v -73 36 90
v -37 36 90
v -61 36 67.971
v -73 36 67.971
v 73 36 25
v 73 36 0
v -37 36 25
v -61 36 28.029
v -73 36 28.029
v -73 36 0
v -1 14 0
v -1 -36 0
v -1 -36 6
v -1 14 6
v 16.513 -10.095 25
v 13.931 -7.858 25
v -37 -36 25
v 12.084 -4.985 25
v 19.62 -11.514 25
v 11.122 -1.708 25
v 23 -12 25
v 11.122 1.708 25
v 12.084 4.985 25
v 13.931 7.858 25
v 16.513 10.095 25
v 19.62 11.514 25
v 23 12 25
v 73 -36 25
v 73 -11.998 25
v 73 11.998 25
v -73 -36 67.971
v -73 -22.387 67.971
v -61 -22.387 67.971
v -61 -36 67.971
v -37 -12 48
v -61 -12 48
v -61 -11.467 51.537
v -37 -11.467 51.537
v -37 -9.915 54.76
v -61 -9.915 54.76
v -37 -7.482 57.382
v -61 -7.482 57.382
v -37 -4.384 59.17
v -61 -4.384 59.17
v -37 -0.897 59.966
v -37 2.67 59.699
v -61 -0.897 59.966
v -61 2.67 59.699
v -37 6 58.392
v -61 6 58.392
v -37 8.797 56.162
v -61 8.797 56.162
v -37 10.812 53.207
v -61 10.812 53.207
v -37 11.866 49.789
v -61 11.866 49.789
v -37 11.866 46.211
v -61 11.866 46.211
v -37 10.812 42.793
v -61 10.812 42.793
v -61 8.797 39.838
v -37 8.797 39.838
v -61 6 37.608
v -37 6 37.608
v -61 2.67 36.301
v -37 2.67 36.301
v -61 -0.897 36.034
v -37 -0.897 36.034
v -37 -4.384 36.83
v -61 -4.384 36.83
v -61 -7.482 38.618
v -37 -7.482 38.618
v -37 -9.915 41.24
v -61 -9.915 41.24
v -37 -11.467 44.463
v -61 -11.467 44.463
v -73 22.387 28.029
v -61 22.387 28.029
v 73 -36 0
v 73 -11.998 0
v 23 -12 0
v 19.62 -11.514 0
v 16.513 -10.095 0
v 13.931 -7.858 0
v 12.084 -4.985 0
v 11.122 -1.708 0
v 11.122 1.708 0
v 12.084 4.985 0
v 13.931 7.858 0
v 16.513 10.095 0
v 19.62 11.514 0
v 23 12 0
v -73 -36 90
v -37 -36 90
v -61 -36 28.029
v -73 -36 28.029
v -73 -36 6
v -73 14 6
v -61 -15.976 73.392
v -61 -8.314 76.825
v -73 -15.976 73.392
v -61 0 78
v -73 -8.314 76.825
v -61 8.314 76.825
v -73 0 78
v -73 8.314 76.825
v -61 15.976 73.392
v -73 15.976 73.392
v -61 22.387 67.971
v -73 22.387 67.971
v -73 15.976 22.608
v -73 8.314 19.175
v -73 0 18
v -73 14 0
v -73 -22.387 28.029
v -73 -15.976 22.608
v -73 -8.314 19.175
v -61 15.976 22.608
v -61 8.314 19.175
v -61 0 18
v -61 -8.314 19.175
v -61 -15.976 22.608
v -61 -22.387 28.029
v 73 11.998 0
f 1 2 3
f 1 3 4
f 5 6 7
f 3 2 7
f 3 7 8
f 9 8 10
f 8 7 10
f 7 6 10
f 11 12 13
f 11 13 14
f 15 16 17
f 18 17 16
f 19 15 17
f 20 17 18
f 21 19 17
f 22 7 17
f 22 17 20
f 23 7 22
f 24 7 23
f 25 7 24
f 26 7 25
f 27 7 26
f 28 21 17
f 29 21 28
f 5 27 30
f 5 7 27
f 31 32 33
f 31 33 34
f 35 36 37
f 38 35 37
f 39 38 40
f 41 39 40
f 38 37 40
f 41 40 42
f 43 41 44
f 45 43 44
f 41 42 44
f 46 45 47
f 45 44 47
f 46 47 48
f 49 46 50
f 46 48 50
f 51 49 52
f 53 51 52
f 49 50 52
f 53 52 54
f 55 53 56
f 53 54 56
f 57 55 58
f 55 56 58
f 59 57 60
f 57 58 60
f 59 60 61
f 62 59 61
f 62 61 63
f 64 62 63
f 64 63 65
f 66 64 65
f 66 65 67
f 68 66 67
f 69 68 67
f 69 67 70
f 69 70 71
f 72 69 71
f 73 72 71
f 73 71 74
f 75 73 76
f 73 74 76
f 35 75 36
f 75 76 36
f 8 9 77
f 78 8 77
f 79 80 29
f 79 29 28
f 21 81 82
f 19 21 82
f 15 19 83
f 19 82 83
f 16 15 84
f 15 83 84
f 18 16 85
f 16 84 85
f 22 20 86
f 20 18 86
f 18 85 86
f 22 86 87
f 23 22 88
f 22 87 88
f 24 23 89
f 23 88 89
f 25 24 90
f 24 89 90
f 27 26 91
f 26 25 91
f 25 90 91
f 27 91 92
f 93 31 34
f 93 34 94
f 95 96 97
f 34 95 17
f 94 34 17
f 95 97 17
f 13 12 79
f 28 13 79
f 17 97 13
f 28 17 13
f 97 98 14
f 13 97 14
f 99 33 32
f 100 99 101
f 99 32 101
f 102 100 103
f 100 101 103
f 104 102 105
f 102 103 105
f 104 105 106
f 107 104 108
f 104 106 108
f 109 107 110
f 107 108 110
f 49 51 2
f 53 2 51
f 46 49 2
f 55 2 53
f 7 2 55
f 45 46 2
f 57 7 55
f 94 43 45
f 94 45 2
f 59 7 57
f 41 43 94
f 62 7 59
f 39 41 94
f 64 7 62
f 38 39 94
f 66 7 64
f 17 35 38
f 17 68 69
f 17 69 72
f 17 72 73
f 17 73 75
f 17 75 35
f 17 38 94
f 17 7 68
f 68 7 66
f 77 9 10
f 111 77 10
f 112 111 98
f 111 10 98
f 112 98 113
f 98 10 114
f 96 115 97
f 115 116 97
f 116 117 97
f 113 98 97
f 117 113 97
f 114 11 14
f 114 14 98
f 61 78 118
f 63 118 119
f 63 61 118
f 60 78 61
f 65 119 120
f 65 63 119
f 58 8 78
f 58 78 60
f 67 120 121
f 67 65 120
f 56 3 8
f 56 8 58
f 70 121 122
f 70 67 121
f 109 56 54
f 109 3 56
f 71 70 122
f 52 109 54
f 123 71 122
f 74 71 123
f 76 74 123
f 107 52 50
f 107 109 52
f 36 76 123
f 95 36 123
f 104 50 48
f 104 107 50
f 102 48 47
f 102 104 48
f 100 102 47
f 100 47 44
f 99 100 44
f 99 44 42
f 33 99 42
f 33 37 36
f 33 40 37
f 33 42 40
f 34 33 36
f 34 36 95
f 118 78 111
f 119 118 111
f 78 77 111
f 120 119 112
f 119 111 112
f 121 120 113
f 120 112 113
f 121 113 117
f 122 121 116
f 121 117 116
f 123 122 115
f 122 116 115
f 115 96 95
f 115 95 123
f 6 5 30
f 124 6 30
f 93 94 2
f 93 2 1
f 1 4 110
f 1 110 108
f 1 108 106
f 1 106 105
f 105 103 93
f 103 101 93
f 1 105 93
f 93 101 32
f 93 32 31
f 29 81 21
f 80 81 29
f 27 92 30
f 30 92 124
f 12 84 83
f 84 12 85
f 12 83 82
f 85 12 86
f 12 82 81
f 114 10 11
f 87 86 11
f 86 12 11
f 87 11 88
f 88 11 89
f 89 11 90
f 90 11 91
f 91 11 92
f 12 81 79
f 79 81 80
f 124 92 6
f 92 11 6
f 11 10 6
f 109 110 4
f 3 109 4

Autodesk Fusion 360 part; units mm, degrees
sketch "Sketch1" plane through (0, 0, 0) normal (0, 0, 1) x (1, 0, 0) in component "New Design"
  line L0 (-73, 36) -> (73, 36)
  line L1 (73, 36) -> (73, -36)
  line L2 (73, -36) -> (-73, -36)
  line L3 (-73, -36) -> (-73, 36)
  line L4 (-73, 36) -> (73, -36) construction
  line L5 (73, 36) -> (-73, -36) construction
  line L6 (-73, -36) -> (-1, -36)
  line L7 (-1, -36) -> (-1, 14)
  line L8 (-1, 14) -> (-73, 14)
  line L9 (-73, 14) -> (-73, -36)
  line L10 (23.0005, 12) -> (73, 11.9981)
  line L11 (23.0005, -12) -> (73, -11.9981)
  arc A0 (24.2094, 11.9389) -> (24.2094, -11.9389) centre (23, 0) ccw
  dimension "d1" = 146
  dimension "d2" = 72
  dimension "d3" = 72
  dimension "d4" = 50
  dimension "d5" = 24
  dimension "d6" = 50
extrude "Extrude1" add sketch "Sketch1" along normal blind 25 contours L0 L1 L2 L3 L7 L8 L10 L11 A0 | L2 L3 L6 L7 L8 L9 in component "New Design"
extrude "Extrude2" cut sketch "Sketch1" along normal blind 6 contours L2 L3 L6 L7 L8 L9 in component "New Design"
sketch "Sketch2" plane through (0, 0, 25) normal (0, 0, 1) x (-1, 0, 0) in component "New Design"
  arc A0 (-23.0005, -12) -> (-23.0005, 12) centre (-23, 0) ccw
  line L0 (-23.0005, -12) -> (-73, -11.9981)
  line L1 (-73, -11.9981) -> (-73, -36)
  line L2 (-73, -36) -> (73, -36)
  line L3 (73, -36) -> (73, 36)
  line L4 (73, 36) -> (-73, 36)
  line L5 (-73, 36) -> (-73, 11.9981)
  line L6 (-73, 11.9981) -> (-23.0005, 12)
  line L7 (73, -36) -> (37, -36)
  line L8 (37, -36) -> (37, 36)
  line L9 (37, 36) -> (73, 36)
  line L10 (73, 36) -> (73, -36)
  dimension "d11" = 36
extrude "Extrude3" add sketch "Sketch2" along normal blind 65 contours L2 L3 L4 L7 L8 L9 L10 in component "New Design"
sketch "Sketch3" plane through (-73, 0, 0) normal (-1, 0, 0) x (0, -1, 0) in component "New Design"
  line L0 (-14, 0) -> (-14, 6)
  line L1 (-14, 6) -> (36, 6)
  line L2 (36, 6) -> (36, 90)
  line L3 (36, 90) -> (-36, 90)
  line L4 (-36, 90) -> (-36, 0)
  line L5 (-36, 0) -> (-14, 0)
sketch "Sketch4" plane through (-73, 0, 45) normal (-1, 0, 0) x (0, -1, 0) in component "New Design"
  circle A0 centre (0, 3) radius 12
  circle A1 centre (0, 3) radius 30
  line L0 (-36, 45) -> (36, 45)
  line L1 (36, 45) -> (36, 21)
  line L2 (36, 21) -> (-36, 21)
  line L3 (-36, 21) -> (-36, 45)
  line L4 (36, -39) -> (-36, -39)
  line L5 (-36, -39) -> (-36, -15)
  line L6 (-36, -15) -> (36, -15)
  line L7 (36, -15) -> (36, -39)
  point P0 (0, -45)
  dimension "d14" = 24
  dimension "d15" = 60
  dimension "d16" = 48
  dimension "d17" = 24
  dimension "d18" = 24
extrude "Extrude4" cut sketch "Sketch4" against normal blind 100 contours A0 in component "New Design"
sketch "Sketch5" plane through (-73, 0, 45) normal (-1, 0, 0) x (0, -1, 0) in component "New Design"
  line L0 (-24, 21) -> (-36, 21)
  line L1 (-36, 21) -> (-36, -15)
  line L2 (-36, -15) -> (-24, -15)
  line L3 (24, 21) -> (36, 21)
  line L4 (36, 21) -> (36, -15)
  line L5 (36, -15) -> (24, -15)
extrude "Extrude5" cut sketch "Sketch4" against normal blind 12 contours A1 L2 L6 | A1 L2 | A1 L6 in component "New Design"
sketch "Sketch6" plane through (-73, 0, 0) normal (-1, 0, 0) x (0, -1, 0) in component "New Design"
  circle A0 centre (0, 48) radius 30
  line L0 (-14, 0) -> (-14, 6)
  line L1 (-14, 6) -> (36, 6)
  line L2 (36, 6) -> (36, 90)
  line L3 (36, 90) -> (-36, 90)
  line L4 (-36, 90) -> (-36, 0)
  line L5 (-36, 0) -> (-14, 0)
  line L6 (-22.3869, 67.9706) -> (-41.8695, 67.9706)
  line L7 (-41.8695, 67.9706) -> (-41.8695, 28.0294)
  line L8 (-41.8695, 28.0294) -> (-22.3869, 28.0294)
  line L9 (-22.3869, 28.0294) -> (-22.3869, 67.9706)
  line L10 (0, 90) -> (0, 18)
  line L11 (41.8695, 28.0294) -> (22.3869, 28.0294)
  line L12 (22.3869, 28.0294) -> (22.3869, 67.9706)
  line L13 (41.8695, 67.9706) -> (41.8695, 28.0294)
  line L14 (22.3869, 67.9706) -> (41.8695, 67.9706)
  dimension "d23" = 19.4825
extrude "Extrude6" cut sketch "Sketch6" against normal blind 12 contours A0 L2 L11 L14 | A0 L4 L6 L8 in component "New Design"
component "New Design" placed x (1, 0, 0) y (0, 1, 0) z (0, 0, 1) at (0, 0, 0)
